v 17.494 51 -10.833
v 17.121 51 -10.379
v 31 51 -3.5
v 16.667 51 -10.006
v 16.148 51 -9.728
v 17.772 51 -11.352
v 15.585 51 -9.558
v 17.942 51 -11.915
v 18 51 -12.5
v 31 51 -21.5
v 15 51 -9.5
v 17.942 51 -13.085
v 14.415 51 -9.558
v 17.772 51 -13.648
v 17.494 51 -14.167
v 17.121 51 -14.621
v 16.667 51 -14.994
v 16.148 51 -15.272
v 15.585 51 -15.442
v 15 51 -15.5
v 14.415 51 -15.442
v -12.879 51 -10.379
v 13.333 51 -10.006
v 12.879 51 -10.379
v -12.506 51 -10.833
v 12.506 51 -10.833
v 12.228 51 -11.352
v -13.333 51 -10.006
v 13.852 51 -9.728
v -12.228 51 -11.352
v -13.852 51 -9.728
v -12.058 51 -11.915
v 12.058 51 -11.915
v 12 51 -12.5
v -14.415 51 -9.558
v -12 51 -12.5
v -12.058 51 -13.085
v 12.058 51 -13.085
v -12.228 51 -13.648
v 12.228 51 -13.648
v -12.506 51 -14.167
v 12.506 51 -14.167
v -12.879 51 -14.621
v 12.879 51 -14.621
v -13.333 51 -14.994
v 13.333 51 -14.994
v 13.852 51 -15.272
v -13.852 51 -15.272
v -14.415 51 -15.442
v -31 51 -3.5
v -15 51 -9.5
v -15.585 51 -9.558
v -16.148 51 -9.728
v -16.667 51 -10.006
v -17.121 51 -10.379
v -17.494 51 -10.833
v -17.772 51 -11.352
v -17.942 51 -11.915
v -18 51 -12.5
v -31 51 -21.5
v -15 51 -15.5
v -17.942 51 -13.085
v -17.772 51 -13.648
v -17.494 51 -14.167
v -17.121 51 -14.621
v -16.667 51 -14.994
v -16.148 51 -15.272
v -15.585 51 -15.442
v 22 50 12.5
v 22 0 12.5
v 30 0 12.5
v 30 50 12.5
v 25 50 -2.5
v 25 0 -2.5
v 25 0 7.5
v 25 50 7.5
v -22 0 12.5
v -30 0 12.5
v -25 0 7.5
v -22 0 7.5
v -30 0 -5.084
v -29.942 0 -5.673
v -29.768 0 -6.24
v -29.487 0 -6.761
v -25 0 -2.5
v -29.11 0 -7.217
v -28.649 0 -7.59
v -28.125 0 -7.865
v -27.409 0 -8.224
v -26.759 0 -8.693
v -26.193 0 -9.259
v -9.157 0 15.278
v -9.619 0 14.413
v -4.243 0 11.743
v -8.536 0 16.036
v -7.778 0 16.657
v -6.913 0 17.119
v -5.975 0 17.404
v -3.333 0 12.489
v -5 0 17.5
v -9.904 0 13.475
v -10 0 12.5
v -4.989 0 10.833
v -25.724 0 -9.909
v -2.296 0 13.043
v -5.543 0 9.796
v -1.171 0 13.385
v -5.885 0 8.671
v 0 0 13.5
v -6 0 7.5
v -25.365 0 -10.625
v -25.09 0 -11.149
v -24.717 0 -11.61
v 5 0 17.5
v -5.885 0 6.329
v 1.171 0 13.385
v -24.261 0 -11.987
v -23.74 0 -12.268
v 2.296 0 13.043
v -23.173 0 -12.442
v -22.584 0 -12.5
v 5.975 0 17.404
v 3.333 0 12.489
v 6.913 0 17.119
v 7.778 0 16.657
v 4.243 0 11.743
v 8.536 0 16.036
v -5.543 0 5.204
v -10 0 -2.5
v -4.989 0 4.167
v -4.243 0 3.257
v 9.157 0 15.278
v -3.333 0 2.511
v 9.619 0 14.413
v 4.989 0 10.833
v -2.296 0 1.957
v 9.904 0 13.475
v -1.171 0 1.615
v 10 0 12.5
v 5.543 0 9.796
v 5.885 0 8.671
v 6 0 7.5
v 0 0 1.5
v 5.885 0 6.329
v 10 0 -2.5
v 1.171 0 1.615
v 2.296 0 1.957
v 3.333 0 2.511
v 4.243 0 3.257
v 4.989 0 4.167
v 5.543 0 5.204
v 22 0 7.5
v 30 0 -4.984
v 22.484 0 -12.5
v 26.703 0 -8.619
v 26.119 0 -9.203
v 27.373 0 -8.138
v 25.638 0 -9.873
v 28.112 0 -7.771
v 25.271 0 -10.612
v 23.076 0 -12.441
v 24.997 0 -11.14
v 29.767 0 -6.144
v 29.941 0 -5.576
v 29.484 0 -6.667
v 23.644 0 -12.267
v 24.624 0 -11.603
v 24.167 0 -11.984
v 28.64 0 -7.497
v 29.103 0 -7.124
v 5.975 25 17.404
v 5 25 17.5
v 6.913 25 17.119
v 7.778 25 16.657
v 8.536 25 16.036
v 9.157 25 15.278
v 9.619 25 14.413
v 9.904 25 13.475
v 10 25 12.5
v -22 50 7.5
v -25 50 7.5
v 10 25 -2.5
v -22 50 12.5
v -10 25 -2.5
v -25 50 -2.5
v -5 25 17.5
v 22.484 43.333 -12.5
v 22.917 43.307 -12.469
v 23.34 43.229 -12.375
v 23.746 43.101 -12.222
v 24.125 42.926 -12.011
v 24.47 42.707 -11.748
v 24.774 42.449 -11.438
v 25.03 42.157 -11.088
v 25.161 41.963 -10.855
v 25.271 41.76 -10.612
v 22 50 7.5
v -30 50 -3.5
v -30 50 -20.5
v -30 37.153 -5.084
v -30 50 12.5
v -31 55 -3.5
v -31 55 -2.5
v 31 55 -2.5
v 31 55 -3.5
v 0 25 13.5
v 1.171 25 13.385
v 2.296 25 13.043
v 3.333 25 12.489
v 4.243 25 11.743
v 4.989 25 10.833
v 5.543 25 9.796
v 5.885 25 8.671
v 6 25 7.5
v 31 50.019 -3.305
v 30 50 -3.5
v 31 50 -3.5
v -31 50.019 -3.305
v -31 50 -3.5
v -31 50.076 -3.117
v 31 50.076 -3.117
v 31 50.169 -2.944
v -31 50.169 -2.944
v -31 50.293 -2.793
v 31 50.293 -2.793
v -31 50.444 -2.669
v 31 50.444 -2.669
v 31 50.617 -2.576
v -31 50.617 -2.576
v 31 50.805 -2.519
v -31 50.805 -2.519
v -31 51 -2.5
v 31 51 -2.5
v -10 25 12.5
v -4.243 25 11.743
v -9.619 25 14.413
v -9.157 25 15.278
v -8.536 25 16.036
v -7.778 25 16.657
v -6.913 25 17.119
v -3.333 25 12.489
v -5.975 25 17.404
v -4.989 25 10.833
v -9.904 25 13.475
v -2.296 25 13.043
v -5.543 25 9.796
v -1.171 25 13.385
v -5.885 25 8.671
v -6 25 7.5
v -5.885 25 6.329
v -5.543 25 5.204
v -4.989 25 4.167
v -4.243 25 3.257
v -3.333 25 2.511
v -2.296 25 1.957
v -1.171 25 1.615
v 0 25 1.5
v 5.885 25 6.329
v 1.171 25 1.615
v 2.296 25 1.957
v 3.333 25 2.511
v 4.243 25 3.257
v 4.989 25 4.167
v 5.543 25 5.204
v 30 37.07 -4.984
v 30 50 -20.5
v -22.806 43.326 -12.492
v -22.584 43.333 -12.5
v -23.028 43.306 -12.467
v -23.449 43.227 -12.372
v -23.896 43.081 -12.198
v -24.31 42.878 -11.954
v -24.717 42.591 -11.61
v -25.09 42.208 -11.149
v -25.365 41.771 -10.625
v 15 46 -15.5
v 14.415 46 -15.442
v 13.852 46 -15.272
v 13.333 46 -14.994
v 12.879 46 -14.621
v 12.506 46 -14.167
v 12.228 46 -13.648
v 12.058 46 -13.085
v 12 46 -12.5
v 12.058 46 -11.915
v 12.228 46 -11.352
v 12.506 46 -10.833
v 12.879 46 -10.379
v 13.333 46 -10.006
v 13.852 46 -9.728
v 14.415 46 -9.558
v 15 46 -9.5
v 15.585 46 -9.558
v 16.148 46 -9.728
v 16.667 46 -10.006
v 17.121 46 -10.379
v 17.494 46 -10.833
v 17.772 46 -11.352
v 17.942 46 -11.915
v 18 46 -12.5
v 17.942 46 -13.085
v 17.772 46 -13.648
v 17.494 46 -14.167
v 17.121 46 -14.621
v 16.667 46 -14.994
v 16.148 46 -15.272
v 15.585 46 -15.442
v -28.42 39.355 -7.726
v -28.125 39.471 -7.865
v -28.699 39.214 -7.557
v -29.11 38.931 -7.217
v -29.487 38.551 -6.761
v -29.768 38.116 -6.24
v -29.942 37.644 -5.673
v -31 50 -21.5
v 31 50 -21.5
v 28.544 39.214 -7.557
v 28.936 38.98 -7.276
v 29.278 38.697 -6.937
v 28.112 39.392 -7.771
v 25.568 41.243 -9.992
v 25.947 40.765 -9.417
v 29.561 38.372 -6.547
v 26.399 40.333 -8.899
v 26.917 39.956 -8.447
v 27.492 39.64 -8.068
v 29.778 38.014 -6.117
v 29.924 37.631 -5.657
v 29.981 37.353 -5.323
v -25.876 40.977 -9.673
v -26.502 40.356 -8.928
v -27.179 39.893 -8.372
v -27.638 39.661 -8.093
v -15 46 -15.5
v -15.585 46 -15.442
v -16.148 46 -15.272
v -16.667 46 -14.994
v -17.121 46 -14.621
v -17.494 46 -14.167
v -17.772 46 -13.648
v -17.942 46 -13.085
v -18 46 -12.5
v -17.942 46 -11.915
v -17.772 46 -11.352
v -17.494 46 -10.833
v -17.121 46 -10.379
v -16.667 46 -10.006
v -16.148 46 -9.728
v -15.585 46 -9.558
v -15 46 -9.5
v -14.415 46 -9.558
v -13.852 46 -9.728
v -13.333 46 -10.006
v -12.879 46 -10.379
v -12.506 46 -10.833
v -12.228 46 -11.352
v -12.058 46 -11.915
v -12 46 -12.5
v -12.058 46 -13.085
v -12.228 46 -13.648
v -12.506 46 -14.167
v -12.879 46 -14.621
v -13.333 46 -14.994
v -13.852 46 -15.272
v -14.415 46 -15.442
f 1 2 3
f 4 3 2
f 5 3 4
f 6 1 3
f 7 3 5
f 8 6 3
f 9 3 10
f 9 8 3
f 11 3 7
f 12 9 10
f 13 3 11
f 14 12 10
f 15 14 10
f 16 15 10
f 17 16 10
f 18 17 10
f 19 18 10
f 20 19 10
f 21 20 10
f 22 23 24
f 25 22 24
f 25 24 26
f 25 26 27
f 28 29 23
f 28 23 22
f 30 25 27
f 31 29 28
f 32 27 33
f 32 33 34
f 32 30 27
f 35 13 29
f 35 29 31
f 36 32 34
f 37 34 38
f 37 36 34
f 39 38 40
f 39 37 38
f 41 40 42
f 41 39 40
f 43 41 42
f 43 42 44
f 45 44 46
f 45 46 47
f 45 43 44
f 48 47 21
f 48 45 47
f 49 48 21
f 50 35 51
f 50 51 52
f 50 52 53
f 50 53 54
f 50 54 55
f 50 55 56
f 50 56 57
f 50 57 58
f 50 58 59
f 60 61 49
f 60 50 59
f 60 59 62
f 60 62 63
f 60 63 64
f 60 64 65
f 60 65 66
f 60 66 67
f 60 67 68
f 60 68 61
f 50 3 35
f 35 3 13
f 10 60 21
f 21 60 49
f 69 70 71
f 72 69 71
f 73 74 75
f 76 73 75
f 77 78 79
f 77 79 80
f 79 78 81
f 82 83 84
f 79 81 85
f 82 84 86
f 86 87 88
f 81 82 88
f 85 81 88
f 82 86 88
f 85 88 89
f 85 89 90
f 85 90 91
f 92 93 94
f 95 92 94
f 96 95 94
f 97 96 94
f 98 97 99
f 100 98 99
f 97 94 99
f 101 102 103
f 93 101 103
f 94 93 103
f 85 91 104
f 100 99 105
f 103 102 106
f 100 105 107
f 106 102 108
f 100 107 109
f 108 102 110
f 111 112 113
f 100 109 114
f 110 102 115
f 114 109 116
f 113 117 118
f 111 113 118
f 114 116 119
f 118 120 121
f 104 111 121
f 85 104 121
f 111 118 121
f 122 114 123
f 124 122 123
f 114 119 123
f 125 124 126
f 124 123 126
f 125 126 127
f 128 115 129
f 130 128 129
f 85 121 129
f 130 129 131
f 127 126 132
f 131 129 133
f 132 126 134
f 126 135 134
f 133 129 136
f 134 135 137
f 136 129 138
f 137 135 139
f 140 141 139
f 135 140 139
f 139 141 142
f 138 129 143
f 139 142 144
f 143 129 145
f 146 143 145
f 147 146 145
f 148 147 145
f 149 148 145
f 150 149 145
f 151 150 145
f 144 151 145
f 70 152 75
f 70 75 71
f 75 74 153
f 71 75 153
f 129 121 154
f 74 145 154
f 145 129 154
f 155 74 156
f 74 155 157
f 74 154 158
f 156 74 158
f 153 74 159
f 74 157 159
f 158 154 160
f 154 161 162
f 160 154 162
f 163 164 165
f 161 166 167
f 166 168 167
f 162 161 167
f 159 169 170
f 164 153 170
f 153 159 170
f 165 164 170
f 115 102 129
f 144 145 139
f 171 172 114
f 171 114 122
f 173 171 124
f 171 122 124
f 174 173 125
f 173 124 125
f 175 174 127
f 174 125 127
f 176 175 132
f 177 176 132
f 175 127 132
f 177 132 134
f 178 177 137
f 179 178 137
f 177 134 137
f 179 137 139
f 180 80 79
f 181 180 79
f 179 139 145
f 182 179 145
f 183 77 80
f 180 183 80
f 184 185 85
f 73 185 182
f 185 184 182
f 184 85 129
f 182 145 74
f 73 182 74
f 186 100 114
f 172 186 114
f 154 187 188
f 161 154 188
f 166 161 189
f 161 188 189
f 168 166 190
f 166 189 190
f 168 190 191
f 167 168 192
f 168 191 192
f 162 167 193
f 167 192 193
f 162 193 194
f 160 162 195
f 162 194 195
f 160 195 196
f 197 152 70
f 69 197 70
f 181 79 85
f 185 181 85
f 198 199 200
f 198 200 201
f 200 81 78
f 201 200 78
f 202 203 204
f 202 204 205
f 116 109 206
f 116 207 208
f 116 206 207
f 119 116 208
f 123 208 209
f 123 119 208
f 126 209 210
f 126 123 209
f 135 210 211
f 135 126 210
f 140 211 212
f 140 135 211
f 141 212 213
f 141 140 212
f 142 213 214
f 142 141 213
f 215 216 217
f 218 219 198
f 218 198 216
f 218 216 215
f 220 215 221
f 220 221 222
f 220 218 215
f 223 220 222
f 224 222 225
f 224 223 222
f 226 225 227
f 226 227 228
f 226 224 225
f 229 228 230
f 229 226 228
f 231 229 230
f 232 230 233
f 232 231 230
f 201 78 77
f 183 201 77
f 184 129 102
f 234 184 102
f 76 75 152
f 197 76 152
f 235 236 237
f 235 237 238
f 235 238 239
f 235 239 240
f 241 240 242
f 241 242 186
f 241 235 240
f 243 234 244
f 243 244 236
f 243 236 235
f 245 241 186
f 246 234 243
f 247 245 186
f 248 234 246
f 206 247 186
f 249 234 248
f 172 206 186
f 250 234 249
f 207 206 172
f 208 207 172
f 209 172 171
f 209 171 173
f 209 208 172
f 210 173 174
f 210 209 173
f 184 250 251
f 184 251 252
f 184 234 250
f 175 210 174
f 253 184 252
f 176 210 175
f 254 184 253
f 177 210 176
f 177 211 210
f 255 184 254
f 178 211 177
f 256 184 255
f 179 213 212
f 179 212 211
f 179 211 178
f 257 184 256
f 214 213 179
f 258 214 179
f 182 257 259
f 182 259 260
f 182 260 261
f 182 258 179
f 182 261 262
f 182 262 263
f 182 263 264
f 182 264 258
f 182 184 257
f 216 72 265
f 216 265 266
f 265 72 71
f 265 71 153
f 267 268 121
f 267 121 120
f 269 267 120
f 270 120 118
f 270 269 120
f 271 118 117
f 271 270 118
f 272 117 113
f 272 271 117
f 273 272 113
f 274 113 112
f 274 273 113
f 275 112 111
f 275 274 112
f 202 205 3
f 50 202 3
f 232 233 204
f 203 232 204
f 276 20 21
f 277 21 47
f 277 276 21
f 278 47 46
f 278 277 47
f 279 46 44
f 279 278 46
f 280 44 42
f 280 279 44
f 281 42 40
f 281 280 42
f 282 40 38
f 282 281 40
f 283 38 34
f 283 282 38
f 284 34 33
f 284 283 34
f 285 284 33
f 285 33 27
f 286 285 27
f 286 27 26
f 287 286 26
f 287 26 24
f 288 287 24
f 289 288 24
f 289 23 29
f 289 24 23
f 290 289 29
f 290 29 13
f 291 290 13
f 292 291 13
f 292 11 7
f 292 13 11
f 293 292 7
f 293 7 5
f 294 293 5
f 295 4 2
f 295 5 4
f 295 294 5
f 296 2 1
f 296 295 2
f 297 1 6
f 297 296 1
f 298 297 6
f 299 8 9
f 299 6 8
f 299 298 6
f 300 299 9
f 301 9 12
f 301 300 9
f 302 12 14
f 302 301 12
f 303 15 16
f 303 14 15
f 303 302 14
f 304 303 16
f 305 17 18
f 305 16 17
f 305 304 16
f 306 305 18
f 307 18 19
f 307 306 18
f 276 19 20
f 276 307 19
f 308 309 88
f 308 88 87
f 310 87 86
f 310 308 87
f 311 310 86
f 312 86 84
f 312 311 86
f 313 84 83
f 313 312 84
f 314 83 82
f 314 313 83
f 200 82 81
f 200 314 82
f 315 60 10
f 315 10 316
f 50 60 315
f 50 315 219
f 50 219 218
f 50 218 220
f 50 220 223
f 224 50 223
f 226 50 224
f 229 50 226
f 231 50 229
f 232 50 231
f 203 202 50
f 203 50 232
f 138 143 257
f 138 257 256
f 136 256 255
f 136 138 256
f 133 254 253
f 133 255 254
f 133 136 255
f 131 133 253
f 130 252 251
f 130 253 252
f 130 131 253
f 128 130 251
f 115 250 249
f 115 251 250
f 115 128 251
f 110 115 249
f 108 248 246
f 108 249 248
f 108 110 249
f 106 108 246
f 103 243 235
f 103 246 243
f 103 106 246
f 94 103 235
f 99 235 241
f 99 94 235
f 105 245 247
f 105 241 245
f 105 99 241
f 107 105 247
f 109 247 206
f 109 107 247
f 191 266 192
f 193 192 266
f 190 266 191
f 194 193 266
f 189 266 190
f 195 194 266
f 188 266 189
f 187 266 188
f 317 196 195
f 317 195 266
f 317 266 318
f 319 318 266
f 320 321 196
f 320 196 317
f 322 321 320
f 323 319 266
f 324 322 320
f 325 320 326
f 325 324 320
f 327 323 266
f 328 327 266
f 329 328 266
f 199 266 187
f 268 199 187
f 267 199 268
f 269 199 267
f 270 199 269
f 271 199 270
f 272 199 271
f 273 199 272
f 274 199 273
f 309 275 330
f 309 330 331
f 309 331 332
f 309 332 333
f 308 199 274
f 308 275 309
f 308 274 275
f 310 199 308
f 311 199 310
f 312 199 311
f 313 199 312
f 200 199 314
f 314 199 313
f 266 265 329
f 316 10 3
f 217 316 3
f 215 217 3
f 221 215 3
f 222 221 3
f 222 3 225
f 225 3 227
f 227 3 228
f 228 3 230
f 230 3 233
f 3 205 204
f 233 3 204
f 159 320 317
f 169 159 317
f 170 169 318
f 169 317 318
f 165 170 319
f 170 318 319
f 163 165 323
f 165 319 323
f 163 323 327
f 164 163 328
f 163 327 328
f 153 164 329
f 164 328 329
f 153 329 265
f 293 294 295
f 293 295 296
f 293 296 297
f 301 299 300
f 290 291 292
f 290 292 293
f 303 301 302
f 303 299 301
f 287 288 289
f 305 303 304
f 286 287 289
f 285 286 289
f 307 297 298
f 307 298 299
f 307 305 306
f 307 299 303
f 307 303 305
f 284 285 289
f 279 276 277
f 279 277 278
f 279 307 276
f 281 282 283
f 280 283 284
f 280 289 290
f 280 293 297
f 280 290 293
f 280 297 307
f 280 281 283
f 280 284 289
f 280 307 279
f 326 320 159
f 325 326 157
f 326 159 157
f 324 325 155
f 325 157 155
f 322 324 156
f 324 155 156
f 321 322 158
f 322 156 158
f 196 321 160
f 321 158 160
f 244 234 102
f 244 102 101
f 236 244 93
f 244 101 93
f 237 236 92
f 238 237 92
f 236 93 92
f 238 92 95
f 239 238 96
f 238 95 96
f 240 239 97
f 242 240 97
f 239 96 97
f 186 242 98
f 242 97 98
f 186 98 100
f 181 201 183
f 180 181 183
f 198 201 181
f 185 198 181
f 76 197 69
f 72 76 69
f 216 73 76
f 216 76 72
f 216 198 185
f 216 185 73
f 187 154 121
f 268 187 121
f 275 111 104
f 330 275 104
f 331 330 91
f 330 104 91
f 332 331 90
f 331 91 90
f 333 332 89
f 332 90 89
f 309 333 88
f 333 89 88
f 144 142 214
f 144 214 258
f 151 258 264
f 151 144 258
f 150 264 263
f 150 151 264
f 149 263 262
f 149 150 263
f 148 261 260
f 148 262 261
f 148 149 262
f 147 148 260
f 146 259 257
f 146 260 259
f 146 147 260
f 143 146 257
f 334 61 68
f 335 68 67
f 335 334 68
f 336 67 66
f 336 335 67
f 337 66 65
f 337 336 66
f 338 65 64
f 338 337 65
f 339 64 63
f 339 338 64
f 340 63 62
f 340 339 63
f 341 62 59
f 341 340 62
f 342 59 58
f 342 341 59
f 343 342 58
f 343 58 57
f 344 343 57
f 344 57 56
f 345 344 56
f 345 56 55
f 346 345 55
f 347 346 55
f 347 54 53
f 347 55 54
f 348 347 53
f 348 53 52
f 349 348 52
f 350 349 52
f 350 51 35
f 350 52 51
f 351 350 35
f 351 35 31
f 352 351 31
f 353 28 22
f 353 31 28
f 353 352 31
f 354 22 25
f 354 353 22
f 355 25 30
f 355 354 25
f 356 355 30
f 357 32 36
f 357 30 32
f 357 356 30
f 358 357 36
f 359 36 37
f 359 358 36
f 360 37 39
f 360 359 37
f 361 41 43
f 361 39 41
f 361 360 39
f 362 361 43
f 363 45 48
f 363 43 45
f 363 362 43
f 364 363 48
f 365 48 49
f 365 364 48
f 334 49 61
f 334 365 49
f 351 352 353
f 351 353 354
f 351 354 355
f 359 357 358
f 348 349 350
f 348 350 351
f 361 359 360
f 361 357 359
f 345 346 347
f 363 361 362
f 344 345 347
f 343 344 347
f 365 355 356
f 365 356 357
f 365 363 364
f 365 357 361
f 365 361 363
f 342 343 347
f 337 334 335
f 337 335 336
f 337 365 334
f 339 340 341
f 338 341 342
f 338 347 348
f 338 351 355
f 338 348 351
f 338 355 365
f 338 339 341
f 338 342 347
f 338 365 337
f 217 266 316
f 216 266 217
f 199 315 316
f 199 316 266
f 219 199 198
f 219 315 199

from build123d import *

# Parameters (mm, degrees)
EXTRUDE_1_DEPTH           = 50
FILLET_3_R                = 3
FILLET_4_R                = 3
EXTRUDE_4_DEPTH           = 60
EXTRUDE_5_DEPTH           = 62
CUT_EXTRUDE_7_DEPTH       = 63.635852353
CUT_EXTRUDE_7_DEPTH_BACK  = 4
SKETCH_8_R                = 3
EXTRUDE_6_DEPTH           = 25
CUT_EXTRUDE_10_DEPTH      = 67.695202226
CUT_EXTRUDE_10_DEPTH_BACK = 10


with BuildPart() as part:
    # 草图2 → 凸台-拉伸1 (new body)
    with BuildSketch(Plane(origin=(0, 0, 0), x_dir=(1, 0, 0), z_dir=(0, 1, 0))):
        with BuildLine():
            Line((25, -7.5), (22, -7.5))
            Line((22, -7.5), (22, -12.5))
            Line((22, -12.5), (30, -12.5))
            Line((30, -12.5), (30, 7.407682229))
            ThreePointArc((30, 7.407682229), (26.399187572, 8.899187572), (24.907682229, 12.5))
            Line((24.907682229, 12.5), (-25, 12.5))
            ThreePointArc((-25, 12.5), (-26.464466094, 8.964466094), (-30, 7.5))
            Line((-30, 7.5), (-30, -12.5))
            Line((-30, -12.5), (-22, -12.5))
            Line((-22, -12.5), (-22, -7.5))
            Line((-22, -7.5), (-25, -7.5))
            Line((-25, -7.5), (-25, 2.5))
            Line((-25, 2.5), (25, 2.5))
            Line((25, 2.5), (25, -7.5))
        make_face()
    extrude(amount=EXTRUDE_1_DEPTH)

    # 圆角3
    fillet_3_edges = [part.edges().sort_by_distance(p)[0] for p in [
        (-30, 25, -7.5),
        (-25, 25, -12.5),
    ]]
    fillet(fillet_3_edges, radius=FILLET_3_R)

    # 圆角4
    fillet_4_edges = [part.edges().sort_by_distance(p)[0] for p in [
        (24.907682229, 25, -12.5),
        (30, 25, -7.407682229),
    ]]
    fillet(fillet_4_edges, radius=FILLET_4_R)

    # 草图5 → 凸台-拉伸4 (add)
    with BuildSketch(Plane.ZY.offset(30)):
        Polygon((-2.5, 50), (-20.5, 50), (-2.5, 35), align=None)
    extrude(amount=-EXTRUDE_4_DEPTH)

    # 草图7 → 凸台-拉伸5 (add)
    with BuildSketch(Plane.ZY.offset(31)):
        with BuildLine():
            Line((-2.5, 51), (-2.5, 51.591557712))
            Line((-2.5, 51.591557712), (-2.5, 55))
            Line((-2.5, 55), (-3.5, 55))
            Line((-3.5, 55), (-3.5, 52))
            ThreePointArc((-3.5, 52), (-2.792893219, 51.707106781), (-2.5, 51))
        make_face()
        with BuildLine():
            ThreePointArc((-3.5, 50), (-2.792893219, 50.292893219), (-2.5, 51))
            ThreePointArc((-2.5, 51), (-2.792893219, 51.707106781), (-3.5, 52))
            Line((-3.5, 52), (-3.5, 51))
            Line((-3.5, 51), (-4.5, 51))
            ThreePointArc((-4.5, 51), (-4.207106781, 50.292893219), (-3.5, 50))
        make_face()
        with BuildLine():
            Line((-21.5, 50), (-3.5, 50))
            ThreePointArc((-3.5, 50), (-4.207106781, 50.292893219), (-4.5, 51))
            Line((-4.5, 51), (-21.5, 51))
            Line((-21.5, 51), (-21.5, 50))
        make_face()
    extrude(amount=-EXTRUDE_5_DEPTH)

    # 草图8 → 切除-拉伸7 (cut, two sides: drawn at the far end of the back side and taken through both)
    with BuildSketch(Plane(origin=(0, 50, 0), x_dir=(1, 0, 0), z_dir=(0, 1, 0)).offset(-CUT_EXTRUDE_7_DEPTH_BACK)):
        with Locations(Location((-15, 12.5, 0), (0, 0, 90))):
            Circle(SKETCH_8_R)
        with Locations(Location((15, 12.5, 0), (0, 0, 90))):
            Circle(SKETCH_8_R)
    extrude(amount=CUT_EXTRUDE_7_DEPTH + CUT_EXTRUDE_7_DEPTH_BACK, mode=Mode.SUBTRACT)

    # 草图9 → 凸台-拉伸6 (add)
    with BuildSketch(Plane(origin=(0, 0, 0), x_dir=(1, 0, 0), z_dir=(0, 1, 0))):
        with BuildLine():
            Line((-5, -17.5), (5, -17.5))
            ThreePointArc((5, -17.5), (8.535533906, -16.035533906), (10, -12.5))
            Line((10, -12.5), (10, 2.5))
            Line((10, 2.5), (-10, 2.5))
            Line((-10, 2.5), (-10, -12.5))
            ThreePointArc((-10, -12.5), (-8.535533906, -16.035533906), (-5, -17.5))
        make_face()
    extrude(amount=EXTRUDE_6_DEPTH)

    # 草图9<8> → 切除-拉伸10 (cut, two sides: drawn at the far end of the back side and taken through both)
    with BuildSketch(Plane(origin=(0, 0, 0), x_dir=(1, 0, 0), z_dir=(0, 1, 0)).offset(-CUT_EXTRUDE_10_DEPTH_BACK)):
        with BuildLine():
            ThreePointArc((0, -1.5), (-6, -7.5), (0, -13.5))
            Line((0, -13.5), (0, -7.5))
            Line((0, -7.5), (0, -1.5))
        make_face()
        with BuildLine():
            Line((0, -7.5), (0, -13.5))
            ThreePointArc((0, -13.5), (4.242640687, -11.742640687), (6, -7.5))
            ThreePointArc((6, -7.5), (4.242640687, -3.257359313), (0, -1.5))
            Line((0, -1.5), (0, -7.5))
        make_face()
    extrude(amount=CUT_EXTRUDE_10_DEPTH + CUT_EXTRUDE_10_DEPTH_BACK, mode=Mode.SUBTRACT)


solid = part.part
